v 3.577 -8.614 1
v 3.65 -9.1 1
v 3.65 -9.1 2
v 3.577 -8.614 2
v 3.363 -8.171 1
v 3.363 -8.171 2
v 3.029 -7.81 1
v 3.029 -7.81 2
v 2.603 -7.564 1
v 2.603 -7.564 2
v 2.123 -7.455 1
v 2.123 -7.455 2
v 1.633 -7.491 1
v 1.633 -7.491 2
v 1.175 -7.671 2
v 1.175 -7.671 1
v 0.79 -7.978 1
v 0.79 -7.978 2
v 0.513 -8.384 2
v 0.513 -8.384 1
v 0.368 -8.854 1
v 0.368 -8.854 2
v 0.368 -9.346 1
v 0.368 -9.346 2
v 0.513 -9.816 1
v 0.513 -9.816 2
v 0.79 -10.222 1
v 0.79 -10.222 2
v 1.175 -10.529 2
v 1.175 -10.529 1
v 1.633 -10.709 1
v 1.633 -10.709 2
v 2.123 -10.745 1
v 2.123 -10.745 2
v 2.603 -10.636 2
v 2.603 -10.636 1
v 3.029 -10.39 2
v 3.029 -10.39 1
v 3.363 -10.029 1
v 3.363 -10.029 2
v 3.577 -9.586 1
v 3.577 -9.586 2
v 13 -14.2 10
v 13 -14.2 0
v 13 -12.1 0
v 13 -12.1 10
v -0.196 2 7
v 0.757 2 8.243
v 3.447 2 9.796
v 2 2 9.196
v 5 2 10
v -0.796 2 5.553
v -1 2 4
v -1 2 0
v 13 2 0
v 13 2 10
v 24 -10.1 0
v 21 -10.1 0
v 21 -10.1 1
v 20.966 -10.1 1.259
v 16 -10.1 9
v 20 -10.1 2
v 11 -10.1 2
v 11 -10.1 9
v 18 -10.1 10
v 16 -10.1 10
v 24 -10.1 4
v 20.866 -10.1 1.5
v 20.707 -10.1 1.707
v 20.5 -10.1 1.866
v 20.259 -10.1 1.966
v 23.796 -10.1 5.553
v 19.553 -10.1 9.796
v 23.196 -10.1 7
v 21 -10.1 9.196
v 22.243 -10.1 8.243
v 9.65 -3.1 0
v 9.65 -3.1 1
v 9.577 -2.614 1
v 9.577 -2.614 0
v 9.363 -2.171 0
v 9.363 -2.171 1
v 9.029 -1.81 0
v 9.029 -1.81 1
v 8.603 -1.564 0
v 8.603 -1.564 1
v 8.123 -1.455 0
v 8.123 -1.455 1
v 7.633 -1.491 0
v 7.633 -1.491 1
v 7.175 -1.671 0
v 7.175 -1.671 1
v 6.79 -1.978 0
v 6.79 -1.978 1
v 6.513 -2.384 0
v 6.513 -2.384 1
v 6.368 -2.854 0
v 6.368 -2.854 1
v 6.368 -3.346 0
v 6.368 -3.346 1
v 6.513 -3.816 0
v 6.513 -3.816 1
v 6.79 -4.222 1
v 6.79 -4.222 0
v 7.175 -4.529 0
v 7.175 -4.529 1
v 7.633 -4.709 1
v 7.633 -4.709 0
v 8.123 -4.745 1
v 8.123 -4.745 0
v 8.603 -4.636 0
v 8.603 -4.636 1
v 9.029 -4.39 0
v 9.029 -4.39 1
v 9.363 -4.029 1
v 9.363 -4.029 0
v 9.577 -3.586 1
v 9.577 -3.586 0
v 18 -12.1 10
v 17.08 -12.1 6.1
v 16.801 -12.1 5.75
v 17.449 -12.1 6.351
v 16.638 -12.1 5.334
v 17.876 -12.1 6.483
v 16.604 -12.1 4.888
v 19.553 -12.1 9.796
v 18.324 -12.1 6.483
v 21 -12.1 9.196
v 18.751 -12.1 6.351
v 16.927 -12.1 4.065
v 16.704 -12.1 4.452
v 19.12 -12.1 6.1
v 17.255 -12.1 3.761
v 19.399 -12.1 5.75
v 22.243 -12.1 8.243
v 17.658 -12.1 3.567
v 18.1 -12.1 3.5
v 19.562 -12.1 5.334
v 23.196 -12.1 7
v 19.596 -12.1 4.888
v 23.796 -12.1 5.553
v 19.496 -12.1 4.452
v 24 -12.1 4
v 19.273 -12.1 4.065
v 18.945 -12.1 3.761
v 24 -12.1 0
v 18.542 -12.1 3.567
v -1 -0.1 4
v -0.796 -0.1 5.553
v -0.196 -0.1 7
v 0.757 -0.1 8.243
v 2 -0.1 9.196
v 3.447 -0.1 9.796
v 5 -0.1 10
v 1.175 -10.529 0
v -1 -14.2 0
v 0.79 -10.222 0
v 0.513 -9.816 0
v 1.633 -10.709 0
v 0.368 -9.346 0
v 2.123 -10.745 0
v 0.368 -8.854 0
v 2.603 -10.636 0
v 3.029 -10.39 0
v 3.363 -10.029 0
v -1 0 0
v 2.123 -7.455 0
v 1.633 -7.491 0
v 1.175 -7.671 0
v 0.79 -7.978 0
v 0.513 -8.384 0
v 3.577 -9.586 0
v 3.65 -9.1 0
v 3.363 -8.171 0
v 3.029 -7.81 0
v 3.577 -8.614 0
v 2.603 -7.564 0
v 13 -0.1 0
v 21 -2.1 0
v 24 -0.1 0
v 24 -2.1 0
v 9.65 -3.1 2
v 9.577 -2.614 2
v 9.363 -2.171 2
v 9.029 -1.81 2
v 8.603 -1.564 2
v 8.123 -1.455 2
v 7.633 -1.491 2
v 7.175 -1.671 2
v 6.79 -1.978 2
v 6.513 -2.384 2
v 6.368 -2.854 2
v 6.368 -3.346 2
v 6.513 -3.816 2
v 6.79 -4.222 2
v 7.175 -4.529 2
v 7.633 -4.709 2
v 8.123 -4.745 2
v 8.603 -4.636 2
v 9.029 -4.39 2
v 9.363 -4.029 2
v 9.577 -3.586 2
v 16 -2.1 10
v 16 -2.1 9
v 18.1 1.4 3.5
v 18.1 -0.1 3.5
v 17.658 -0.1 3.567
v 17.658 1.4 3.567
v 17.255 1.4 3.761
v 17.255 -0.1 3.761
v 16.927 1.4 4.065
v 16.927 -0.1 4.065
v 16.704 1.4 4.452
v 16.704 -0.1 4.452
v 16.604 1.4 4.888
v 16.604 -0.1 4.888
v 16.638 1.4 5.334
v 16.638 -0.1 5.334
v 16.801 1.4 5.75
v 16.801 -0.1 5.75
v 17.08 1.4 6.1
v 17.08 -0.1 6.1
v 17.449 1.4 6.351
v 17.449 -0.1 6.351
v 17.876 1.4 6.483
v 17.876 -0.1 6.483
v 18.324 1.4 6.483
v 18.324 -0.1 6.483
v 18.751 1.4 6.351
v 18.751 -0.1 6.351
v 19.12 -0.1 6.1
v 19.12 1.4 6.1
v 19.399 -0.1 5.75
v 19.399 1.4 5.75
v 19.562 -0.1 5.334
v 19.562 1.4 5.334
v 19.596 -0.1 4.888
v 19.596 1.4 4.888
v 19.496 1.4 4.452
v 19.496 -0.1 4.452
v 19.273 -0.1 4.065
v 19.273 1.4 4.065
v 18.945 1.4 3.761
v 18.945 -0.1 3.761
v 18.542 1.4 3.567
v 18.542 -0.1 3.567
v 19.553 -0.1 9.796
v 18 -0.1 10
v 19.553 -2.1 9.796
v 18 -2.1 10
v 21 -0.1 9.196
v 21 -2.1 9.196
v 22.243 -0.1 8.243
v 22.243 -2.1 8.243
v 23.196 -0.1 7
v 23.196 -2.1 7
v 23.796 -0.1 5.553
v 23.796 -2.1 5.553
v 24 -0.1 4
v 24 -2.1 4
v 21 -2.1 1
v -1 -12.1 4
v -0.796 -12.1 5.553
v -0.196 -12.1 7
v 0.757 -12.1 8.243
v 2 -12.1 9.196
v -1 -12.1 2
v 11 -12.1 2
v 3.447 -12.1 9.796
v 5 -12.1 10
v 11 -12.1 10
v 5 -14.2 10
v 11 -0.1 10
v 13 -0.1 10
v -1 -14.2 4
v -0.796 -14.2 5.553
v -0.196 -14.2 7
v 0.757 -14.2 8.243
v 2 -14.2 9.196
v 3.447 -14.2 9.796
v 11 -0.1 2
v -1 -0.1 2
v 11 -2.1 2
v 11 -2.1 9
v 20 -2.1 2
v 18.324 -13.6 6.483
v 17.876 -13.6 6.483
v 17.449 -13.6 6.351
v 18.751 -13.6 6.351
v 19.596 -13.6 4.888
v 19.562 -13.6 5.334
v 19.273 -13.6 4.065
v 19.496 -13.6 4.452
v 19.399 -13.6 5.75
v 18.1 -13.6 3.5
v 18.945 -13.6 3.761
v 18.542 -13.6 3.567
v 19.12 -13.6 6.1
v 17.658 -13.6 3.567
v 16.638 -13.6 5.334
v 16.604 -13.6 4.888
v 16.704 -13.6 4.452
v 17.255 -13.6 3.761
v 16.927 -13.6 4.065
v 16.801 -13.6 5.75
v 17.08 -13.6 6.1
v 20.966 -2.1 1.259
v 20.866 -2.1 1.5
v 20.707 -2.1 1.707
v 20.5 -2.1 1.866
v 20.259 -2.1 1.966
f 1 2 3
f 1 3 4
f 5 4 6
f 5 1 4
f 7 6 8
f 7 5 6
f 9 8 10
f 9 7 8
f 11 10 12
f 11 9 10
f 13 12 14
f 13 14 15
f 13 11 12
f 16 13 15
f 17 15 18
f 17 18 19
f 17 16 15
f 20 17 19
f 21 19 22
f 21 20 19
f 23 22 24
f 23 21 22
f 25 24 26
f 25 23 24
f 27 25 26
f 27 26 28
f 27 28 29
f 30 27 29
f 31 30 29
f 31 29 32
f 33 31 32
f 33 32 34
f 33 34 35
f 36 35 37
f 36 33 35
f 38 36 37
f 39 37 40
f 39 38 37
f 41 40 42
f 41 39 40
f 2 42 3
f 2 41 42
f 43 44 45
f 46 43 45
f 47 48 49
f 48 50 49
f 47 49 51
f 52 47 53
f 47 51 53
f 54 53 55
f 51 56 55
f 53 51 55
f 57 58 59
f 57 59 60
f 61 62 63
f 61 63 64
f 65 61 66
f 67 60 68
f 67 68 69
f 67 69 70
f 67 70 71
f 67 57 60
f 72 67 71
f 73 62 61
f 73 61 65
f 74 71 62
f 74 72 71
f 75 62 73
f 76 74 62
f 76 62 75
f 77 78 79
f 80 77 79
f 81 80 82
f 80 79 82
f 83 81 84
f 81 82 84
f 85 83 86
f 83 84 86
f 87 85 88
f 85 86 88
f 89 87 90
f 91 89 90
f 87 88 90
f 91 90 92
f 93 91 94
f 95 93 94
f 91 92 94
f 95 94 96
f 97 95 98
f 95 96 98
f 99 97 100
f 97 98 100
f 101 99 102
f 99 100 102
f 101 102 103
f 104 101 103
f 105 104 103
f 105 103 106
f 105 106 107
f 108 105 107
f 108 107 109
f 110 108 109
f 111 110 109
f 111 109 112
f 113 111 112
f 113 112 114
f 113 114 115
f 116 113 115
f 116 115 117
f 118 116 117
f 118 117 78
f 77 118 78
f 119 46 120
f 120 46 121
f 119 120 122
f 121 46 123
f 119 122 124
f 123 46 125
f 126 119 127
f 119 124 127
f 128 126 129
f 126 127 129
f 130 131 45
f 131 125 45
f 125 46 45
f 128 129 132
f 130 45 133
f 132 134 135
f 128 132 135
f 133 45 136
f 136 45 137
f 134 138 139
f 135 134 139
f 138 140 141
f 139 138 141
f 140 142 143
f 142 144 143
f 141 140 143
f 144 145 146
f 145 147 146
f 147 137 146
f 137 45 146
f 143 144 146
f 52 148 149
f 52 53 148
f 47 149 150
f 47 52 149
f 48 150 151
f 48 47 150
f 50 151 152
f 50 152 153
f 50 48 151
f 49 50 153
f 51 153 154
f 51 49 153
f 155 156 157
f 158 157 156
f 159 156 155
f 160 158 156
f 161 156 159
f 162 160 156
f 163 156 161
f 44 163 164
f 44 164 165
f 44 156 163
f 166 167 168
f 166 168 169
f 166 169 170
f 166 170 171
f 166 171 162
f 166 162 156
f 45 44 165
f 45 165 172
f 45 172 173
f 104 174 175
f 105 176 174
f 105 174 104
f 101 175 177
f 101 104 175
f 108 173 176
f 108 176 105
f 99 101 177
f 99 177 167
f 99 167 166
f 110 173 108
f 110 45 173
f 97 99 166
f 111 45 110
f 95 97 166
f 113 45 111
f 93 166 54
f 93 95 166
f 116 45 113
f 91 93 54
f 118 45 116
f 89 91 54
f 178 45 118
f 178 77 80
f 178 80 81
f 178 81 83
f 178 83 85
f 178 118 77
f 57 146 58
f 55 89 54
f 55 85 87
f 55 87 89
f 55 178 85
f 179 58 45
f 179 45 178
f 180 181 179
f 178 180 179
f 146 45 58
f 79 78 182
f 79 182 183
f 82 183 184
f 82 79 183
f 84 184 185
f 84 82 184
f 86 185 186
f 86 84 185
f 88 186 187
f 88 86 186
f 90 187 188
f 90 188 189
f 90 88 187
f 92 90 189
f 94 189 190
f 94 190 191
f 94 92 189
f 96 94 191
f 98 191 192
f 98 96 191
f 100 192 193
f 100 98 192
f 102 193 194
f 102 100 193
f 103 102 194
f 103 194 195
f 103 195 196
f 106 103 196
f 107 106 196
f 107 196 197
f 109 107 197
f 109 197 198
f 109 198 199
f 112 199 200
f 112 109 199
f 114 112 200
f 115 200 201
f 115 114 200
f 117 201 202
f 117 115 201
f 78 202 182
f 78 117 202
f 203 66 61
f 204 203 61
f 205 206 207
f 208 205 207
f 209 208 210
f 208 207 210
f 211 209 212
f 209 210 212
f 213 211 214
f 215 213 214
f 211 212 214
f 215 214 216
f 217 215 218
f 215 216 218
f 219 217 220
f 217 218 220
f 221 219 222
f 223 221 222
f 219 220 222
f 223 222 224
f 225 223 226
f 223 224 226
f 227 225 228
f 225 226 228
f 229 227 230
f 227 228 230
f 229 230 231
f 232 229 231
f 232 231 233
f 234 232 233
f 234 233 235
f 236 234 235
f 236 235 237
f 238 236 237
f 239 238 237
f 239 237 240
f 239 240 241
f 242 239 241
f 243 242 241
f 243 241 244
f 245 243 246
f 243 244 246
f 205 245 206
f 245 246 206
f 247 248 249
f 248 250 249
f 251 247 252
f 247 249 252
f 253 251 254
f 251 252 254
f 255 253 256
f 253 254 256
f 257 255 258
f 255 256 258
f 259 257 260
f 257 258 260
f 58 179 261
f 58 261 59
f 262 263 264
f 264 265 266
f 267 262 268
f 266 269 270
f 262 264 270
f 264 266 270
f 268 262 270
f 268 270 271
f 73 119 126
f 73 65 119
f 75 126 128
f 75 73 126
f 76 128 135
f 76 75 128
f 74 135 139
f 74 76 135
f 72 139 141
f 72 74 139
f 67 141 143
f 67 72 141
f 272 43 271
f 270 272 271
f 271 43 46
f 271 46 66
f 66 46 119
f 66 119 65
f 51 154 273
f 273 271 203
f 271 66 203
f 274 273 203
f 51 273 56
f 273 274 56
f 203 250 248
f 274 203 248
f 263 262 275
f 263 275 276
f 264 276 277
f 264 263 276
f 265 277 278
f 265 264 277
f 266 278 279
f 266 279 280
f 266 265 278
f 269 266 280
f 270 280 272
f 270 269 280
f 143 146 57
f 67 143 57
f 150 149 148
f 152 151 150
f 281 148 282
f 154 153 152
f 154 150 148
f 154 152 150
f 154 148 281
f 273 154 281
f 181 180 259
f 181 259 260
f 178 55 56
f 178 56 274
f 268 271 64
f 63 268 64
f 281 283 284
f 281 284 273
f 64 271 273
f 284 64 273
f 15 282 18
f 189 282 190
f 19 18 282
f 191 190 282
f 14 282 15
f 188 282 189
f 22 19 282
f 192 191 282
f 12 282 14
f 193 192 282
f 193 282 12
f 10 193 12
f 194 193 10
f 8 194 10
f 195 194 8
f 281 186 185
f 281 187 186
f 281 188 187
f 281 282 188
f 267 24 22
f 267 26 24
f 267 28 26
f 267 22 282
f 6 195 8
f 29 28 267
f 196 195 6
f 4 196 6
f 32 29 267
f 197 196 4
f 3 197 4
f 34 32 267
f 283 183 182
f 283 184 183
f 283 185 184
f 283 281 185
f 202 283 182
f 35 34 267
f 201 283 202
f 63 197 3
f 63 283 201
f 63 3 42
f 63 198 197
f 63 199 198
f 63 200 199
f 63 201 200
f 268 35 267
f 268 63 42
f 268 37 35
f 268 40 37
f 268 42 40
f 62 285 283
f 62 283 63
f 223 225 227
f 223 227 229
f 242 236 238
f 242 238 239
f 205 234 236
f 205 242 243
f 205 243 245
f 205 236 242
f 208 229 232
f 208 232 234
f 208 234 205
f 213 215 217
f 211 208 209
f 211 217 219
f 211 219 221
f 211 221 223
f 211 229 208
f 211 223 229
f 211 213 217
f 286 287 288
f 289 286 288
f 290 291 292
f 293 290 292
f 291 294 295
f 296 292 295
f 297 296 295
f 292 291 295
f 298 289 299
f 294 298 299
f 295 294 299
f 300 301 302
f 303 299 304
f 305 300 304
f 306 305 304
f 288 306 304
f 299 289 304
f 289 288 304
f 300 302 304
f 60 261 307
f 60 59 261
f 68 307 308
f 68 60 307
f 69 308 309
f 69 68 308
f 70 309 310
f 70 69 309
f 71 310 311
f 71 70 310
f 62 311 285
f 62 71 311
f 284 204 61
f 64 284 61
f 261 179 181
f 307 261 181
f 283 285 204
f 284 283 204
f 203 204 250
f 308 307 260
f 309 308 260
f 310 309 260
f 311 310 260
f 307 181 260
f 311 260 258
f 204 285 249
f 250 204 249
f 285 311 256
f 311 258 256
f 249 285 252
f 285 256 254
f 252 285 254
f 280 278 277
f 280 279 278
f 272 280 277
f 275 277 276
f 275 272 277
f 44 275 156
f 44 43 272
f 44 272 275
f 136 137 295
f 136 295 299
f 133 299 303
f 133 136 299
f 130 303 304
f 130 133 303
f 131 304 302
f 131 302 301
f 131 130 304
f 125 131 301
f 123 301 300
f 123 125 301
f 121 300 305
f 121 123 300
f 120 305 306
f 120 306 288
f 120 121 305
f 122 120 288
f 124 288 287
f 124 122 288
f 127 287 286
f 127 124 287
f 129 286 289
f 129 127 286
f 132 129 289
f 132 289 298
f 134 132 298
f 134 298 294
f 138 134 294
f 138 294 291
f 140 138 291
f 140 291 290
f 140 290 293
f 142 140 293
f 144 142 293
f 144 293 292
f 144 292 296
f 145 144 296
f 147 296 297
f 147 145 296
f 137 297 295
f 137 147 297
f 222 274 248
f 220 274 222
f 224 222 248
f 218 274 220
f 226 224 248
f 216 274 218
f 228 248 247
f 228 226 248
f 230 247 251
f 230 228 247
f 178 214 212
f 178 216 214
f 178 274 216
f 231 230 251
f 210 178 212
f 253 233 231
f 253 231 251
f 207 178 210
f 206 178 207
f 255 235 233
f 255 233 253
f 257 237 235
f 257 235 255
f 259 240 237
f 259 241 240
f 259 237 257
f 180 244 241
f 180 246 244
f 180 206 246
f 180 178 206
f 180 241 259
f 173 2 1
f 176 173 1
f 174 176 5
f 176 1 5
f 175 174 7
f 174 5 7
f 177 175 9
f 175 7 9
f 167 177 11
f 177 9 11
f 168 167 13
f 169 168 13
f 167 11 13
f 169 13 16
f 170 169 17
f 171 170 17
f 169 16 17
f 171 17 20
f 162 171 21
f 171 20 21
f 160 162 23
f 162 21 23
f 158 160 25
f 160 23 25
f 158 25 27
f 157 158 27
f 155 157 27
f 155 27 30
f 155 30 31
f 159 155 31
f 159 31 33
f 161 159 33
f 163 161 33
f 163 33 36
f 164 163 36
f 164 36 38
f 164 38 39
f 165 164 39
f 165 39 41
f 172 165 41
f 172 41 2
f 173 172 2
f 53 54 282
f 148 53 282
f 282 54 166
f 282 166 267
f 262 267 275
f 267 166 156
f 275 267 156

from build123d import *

# Parameters (mm, degrees)
EXTRUDE_2_DEPTH     = 10
SKETCH_3_R          = 1.5
EXTRUDE_3_DEPTH     = 1.5
SKETCH_5_R          = 1.65
CUT_EXTRUDE_2_DEPTH = 27.084669827
FILLET_1_R          = 6
SKETCH_6_W          = 10
SKETCH_6_H          = 1
SKETCH_6_W_2        = 5
EXTRUDE_4_DEPTH     = 4
SKETCH_7_W          = 5.689599517
SKETCH_7_H          = 3.3
CUT_EXTRUDE_3_DEPTH = 0.5
SKETCH_8_W          = 11.306526487
SKETCH_8_H          = 19.042570926
CUT_EXTRUDE_4_DEPTH = 30.624989451
MOVE_FACE_1_BY      = 12
CUT_EXTRUDE_5_REACH = 31.625
SKETCH_9_W          = 14.188350819
SKETCH_9_H          = 12
SKETCH_10_R         = 1.65
CUT_EXTRUDE_6_DEPTH = 30.302559615
FILLET_2_R          = 6
MOVE_FACE_2_BY      = 1
FILLET_3_R          = 1


with BuildPart() as part:
    # Эскиз2 → Бобышка-Вытянуть2 (new body)
    with BuildSketch(Plane.XY):
        Polygon((0, 0), (0, 2), (13, 2), (13, -0.1), (24, -0.1), (24, -2.1), (11, -2.1), (11, 0), align=None)
    extrude(amount=EXTRUDE_2_DEPTH)

    # Эскиз3 → Бобышка-Вытянуть3 (add)
    with BuildSketch(Plane(origin=(0, -0.1, 0), x_dir=(1, 0, 0), z_dir=(0, 1, 0))):
        with Locations(Location((18.1, -5, 0), (0, 0, 90))):
            Circle(SKETCH_3_R)
    extrude(amount=EXTRUDE_3_DEPTH)

    # Эскиз5 → Вырез-Вытянуть2 (cut, through all)
    with BuildSketch(Plane.XZ):
        with Locations((5, 5)):
            Circle(SKETCH_5_R)
    extrude(amount=-CUT_EXTRUDE_2_DEPTH, mode=Mode.SUBTRACT)

    # Скругление1
    fillet_1_edges = [part.edges().sort_by_distance(p)[0] for p in [
        (24, -1.1, 10),
        (0, 1, 10),
    ]]
    fillet(fillet_1_edges, radius=FILLET_1_R)

    # Эскиз6 → Бобышка-Вытянуть4 (add)
    with BuildSketch(Plane(origin=(0, -2.1, 0), x_dir=(-1, 0, 0), z_dir=(0, -1, 0))):
        with Locations((-16, -0.5)):
            Rectangle(SKETCH_6_W, SKETCH_6_H)
        with Locations((-13.5, -9.5)):
            Rectangle(SKETCH_6_W_2, SKETCH_6_H)
    extrude(amount=EXTRUDE_4_DEPTH)

    # Эскиз7 → Вырез-Вытянуть3 (cut)
    with BuildSketch(Plane.XZ):
        with Locations((2.155200242, 5)):
            Rectangle(SKETCH_7_W, SKETCH_7_H)
    extrude(amount=-CUT_EXTRUDE_3_DEPTH, mode=Mode.SUBTRACT)

    # Зеркальное отражение1: part across plane


with BuildPart() as part_1:
    add(part.part)
    add(part.part.mirror(Plane.ZX.offset(-6.1)))

    # Эскиз8 → Вырез-Вытянуть4 (cut, through all)
    with BuildSketch(Plane.XY.offset(10)):
        with Locations((5.346736757, -6.608790605)):
            Rectangle(SKETCH_8_W, SKETCH_8_H)
    extrude(amount=-CUT_EXTRUDE_4_DEPTH, mode=Mode.SUBTRACT)

    # Move Face 1: a face moved outward by 12.0
    extrude(part_1.faces().sort_by_distance((11, -10.15, 5))[0], amount=MOVE_FACE_1_BY, dir=(-1, 0, 0))

    # Вырез-Вытянуть5: up to this face of the body (flat: up to its plane)
    cut_extrude_5_end = Plane(part_1.part.faces().sort_by_distance((10, -6.1, 1))[0])
    # Эскиз9 → Вырез-Вытянуть5 (cut, up to the picked face)
    with BuildSketch(Plane.XY.offset(10), mode=Mode.PRIVATE) as cut_extrude_5_sk1:
        with Locations((3.90582459, -6.1)):
            Rectangle(SKETCH_9_W, SKETCH_9_H)
    cut_extrude_5_tool1 = split(extrude(cut_extrude_5_sk1.sketch, amount=-CUT_EXTRUDE_5_REACH, mode=Mode.PRIVATE), bisect_by=cut_extrude_5_end, keep=Keep.BOTH, mode=Mode.PRIVATE)
    add(cut_extrude_5_tool1.solids().sort_by(Axis((3.905825, -6.1, 10), (0, 0, -1)))[0], mode=Mode.SUBTRACT)

    # Эскиз10 → Вырез-Вытянуть6 (cut, through all)
    with BuildSketch(Plane.XY.offset(1)):
        with Locations((2, -9.1)):
            Circle(SKETCH_10_R)
        with Locations((8, -3.1)):
            Circle(SKETCH_10_R)
    extrude(amount=-CUT_EXTRUDE_6_DEPTH, mode=Mode.SUBTRACT)

    # Скругление2
    fillet_2_edges = [part_1.edges().sort_by_distance(p)[0] for p in [
        (-1, -13.15, 10),
        (-1, 0.95, 10),
    ]]
    fillet(fillet_2_edges, radius=FILLET_2_R)

    # Move Face 2: a face moved outward by 1.0
    extrude(part_1.faces().sort_by_distance((9.253385216, -6.1, 1))[0], amount=MOVE_FACE_2_BY, dir=(0, 0, 1))

    # Скругление3
    fillet_3_edges = [part_1.edges().sort_by_distance(p)[0] for p in [
        (21, -6.1, 2),
    ]]
    fillet(fillet_3_edges, radius=FILLET_3_R)


solid = part_1.part
